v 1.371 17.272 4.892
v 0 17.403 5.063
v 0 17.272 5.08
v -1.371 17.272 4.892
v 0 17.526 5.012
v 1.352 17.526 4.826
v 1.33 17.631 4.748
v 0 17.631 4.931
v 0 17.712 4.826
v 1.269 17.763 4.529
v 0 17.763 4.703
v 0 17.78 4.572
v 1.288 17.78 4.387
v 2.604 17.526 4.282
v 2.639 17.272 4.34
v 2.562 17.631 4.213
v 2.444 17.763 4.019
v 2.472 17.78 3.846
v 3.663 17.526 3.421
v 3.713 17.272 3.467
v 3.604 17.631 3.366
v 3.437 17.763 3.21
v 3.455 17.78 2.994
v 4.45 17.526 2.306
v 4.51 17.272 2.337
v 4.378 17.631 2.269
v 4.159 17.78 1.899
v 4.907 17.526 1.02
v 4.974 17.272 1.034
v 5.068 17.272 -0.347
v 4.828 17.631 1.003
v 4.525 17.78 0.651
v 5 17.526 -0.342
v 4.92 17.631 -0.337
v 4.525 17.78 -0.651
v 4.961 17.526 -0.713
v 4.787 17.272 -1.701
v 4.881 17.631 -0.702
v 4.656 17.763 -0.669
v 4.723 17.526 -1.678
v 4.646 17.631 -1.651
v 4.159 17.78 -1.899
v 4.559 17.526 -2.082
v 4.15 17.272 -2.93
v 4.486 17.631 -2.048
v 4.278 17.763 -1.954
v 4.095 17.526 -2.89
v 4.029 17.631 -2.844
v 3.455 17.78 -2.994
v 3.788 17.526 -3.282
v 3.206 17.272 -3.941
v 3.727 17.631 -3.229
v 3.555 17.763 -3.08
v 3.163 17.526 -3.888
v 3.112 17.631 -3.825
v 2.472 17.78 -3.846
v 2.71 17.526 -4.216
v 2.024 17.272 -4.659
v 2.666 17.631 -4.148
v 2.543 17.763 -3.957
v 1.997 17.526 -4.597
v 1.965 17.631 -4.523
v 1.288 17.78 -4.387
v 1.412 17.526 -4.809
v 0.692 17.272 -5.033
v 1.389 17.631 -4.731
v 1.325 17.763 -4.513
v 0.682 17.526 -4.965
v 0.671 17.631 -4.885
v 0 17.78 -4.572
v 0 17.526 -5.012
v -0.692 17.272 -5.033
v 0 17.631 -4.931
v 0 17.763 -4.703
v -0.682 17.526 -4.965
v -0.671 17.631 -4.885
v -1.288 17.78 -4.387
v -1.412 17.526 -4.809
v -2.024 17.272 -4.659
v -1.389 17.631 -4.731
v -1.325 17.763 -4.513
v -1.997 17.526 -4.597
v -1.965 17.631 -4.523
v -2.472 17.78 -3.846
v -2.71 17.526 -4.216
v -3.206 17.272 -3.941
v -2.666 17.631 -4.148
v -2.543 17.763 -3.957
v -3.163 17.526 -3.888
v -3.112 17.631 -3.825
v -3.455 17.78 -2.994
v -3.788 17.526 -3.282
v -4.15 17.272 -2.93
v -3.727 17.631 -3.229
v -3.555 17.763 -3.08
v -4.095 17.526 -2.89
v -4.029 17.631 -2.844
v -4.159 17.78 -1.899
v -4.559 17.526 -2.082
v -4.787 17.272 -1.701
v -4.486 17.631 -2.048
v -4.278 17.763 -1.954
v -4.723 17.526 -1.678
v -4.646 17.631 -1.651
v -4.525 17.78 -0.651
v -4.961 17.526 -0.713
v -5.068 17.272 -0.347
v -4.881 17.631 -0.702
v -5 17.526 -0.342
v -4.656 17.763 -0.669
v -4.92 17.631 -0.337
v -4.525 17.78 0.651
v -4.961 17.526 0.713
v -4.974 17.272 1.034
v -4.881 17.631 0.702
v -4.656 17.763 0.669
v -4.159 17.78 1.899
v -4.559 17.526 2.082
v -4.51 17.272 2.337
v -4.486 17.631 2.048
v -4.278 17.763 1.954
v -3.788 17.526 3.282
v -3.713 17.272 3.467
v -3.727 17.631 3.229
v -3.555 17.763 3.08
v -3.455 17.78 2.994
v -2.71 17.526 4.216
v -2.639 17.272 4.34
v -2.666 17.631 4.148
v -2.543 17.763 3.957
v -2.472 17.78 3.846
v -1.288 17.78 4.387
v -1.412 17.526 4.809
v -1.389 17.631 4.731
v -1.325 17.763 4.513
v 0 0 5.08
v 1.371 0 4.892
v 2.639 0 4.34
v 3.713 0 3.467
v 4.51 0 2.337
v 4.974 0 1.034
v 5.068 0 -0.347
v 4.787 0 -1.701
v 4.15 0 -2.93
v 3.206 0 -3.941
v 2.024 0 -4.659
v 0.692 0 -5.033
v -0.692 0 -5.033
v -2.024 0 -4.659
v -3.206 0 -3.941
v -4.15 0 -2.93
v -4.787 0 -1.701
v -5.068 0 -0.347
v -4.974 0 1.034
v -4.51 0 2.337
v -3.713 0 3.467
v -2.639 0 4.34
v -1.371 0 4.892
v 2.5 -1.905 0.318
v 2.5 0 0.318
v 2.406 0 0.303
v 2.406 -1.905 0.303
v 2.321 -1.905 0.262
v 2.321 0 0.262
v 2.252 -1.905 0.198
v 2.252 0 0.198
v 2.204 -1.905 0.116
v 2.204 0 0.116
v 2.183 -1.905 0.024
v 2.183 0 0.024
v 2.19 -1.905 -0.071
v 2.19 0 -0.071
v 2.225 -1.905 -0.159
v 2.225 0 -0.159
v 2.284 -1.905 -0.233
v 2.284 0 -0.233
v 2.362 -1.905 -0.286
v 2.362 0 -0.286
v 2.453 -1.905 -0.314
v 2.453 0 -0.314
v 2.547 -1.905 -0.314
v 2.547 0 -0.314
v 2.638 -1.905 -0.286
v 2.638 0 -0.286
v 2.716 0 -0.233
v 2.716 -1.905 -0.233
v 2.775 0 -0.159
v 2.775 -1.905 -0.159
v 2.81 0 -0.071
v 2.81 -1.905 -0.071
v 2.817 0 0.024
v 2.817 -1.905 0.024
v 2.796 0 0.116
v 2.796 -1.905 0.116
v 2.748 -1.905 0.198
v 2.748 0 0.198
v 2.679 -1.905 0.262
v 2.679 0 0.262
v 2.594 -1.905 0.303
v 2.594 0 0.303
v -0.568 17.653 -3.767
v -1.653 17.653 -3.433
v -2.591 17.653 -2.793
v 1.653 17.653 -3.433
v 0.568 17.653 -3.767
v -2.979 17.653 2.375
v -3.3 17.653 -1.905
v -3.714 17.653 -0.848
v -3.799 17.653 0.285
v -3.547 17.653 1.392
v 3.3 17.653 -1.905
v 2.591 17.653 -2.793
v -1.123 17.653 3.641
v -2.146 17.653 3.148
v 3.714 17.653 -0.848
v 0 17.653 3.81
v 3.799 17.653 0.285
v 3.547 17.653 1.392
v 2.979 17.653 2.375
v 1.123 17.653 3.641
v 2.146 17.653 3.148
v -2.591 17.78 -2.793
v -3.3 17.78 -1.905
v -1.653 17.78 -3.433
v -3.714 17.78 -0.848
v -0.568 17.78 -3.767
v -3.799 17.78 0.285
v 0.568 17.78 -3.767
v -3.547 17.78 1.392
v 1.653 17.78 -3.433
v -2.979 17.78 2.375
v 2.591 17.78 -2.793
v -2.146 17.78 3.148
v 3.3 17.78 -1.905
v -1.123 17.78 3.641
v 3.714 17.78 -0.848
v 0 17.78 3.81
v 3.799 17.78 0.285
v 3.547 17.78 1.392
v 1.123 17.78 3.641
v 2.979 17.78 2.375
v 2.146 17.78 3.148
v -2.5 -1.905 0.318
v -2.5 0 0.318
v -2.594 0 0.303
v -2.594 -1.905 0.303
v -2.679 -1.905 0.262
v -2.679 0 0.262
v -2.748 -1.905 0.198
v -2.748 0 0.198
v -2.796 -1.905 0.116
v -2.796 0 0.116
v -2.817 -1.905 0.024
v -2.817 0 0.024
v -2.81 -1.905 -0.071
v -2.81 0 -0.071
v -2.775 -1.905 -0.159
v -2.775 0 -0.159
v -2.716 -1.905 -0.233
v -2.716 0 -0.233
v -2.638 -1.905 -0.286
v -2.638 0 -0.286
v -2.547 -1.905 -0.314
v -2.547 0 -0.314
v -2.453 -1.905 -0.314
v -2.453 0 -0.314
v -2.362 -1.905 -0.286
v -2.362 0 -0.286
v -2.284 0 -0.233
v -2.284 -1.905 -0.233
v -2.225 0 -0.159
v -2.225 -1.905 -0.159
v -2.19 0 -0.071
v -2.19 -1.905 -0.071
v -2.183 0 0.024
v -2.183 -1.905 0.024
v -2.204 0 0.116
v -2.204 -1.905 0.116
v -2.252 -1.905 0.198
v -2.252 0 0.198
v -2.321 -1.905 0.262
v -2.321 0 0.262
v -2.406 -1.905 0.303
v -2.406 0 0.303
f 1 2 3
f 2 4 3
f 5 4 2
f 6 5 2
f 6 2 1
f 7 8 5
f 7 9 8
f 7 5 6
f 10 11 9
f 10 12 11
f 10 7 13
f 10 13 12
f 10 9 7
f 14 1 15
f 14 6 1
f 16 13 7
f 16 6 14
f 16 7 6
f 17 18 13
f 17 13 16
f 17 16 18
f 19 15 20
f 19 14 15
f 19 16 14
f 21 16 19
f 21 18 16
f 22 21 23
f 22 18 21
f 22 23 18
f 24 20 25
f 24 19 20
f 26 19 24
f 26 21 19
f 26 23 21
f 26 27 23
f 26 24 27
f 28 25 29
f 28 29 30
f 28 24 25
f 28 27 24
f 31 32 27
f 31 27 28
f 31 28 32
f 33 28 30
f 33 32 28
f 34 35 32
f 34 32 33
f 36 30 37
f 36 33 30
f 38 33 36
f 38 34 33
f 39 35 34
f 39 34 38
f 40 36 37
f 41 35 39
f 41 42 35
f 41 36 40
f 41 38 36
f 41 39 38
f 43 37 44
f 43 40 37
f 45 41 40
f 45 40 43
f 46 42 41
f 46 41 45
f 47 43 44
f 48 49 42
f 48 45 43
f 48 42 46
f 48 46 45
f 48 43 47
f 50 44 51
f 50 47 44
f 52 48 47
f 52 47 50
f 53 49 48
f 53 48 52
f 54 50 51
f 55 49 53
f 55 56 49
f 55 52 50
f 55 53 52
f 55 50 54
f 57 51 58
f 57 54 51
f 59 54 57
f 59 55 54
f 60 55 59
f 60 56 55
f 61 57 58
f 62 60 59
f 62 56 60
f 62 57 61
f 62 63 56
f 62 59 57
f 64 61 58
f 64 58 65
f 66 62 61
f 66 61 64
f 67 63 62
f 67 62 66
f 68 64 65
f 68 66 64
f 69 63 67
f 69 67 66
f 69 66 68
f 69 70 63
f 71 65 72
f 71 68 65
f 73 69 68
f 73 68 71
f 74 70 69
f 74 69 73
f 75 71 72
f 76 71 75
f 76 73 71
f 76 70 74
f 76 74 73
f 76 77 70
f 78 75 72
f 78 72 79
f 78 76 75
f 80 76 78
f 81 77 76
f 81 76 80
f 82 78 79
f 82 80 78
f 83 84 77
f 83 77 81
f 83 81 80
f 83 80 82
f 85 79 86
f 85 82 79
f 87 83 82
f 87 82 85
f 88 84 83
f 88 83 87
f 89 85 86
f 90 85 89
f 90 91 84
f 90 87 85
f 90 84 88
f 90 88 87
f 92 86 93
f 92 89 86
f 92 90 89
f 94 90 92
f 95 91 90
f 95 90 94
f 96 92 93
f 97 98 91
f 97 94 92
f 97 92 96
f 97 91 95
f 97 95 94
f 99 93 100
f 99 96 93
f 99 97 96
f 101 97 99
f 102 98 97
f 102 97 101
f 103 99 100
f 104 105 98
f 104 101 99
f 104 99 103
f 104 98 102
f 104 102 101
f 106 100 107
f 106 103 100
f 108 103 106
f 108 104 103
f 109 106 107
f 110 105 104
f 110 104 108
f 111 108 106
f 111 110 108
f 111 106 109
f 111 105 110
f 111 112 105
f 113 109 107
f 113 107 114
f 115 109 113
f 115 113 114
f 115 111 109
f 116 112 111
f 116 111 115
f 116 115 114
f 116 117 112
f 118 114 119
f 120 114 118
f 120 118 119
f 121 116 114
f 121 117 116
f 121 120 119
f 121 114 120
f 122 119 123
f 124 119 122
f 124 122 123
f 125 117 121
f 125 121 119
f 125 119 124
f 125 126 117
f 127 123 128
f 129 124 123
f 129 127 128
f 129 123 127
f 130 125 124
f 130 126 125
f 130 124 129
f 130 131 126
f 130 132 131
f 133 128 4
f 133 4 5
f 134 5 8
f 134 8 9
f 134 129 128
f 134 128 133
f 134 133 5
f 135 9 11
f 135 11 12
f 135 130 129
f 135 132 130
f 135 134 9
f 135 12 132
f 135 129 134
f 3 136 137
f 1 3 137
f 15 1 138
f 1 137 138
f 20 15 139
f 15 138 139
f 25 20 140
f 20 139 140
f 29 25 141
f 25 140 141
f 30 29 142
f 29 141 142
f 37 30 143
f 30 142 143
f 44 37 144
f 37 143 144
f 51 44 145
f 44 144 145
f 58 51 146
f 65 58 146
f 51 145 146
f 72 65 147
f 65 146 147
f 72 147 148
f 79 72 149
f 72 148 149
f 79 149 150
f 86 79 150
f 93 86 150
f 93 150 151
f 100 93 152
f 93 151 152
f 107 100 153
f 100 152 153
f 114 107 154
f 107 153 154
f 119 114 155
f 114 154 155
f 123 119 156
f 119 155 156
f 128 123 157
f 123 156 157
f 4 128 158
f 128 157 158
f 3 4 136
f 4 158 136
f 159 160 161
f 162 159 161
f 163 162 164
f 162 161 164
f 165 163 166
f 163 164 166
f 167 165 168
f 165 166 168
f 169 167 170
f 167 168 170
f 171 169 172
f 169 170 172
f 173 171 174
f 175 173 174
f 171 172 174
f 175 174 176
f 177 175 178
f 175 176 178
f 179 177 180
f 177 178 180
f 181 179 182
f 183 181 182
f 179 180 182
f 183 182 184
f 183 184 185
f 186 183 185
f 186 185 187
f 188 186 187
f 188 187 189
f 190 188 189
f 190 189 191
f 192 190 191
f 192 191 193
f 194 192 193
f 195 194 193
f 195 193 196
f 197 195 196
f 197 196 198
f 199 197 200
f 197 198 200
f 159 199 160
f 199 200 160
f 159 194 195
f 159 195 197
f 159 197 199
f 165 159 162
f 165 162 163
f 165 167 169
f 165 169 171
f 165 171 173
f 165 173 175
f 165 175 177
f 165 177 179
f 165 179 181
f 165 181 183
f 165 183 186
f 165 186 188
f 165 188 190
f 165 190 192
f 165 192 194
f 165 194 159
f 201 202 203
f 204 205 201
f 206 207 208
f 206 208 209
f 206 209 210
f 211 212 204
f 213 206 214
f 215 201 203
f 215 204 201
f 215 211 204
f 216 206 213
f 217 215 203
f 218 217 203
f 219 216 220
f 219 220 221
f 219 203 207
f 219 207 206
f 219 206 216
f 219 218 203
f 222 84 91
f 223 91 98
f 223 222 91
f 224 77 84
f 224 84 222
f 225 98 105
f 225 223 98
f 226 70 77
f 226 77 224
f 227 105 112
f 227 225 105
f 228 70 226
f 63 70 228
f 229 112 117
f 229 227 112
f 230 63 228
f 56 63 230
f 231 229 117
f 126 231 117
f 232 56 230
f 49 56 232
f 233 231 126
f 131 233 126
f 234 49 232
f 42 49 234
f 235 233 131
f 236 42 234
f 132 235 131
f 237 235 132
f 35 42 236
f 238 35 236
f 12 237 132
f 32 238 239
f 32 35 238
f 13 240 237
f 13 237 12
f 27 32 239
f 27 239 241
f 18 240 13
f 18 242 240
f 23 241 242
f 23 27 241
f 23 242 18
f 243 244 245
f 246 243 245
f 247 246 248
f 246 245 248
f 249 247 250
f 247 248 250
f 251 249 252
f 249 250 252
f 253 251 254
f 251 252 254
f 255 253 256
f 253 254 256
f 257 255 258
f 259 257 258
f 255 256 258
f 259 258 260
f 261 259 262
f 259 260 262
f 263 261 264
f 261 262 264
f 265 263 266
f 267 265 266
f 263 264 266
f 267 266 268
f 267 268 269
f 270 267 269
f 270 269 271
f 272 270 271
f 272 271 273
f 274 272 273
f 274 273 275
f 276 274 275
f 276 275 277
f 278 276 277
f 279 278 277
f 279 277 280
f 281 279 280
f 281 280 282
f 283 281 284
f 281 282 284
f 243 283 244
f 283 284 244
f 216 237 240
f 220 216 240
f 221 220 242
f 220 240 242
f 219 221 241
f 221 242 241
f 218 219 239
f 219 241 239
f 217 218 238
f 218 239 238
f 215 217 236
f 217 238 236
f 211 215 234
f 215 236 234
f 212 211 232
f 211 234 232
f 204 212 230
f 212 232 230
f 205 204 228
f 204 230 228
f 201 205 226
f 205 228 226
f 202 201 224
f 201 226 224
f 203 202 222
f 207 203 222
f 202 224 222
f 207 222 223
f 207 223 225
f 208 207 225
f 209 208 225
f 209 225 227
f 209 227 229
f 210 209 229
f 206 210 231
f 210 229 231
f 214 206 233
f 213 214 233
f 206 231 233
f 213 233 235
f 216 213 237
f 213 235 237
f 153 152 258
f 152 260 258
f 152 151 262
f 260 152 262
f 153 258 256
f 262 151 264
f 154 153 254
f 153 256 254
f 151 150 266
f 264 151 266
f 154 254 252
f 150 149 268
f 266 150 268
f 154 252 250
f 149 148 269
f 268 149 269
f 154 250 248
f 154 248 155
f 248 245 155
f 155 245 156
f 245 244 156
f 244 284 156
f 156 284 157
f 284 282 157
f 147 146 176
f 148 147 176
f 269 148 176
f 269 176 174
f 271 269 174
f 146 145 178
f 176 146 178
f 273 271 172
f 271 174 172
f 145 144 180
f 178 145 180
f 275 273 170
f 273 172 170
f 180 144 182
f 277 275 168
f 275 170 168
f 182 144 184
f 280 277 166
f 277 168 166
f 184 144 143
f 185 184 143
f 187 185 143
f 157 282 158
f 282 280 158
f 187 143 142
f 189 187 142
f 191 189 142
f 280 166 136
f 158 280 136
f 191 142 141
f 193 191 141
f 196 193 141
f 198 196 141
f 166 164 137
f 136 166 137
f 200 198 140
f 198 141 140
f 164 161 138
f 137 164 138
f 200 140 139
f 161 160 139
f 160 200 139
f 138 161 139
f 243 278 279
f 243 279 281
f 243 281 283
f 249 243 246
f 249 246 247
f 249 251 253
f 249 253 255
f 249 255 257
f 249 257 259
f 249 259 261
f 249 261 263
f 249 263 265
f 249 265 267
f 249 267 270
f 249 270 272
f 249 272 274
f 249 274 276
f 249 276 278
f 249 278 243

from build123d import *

# Parameters (mm, degrees)
SKETCH1_R           = 5.08
BOSS_EXTRUDE1_DEPTH = 17.78
SKETCH2_R           = 0.3175
BOSS_EXTRUDE2_DEPTH = 1.905
SKETCH3_R           = 3.81
CUT_EXTRUDE1_DEPTH  = 0.127
FILLET1_R           = 0.508


with BuildPart() as part:
    # Sketch1 → Boss-Extrude1 (new body)
    with BuildSketch(Plane(origin=(0, 0, 0), x_dir=(1, 0, 0), z_dir=(0, 1, 0))):
        with Locations(Location((0, 0, 0), (0, 0, 270))):
            Circle(SKETCH1_R)
    extrude(amount=BOSS_EXTRUDE1_DEPTH)

    # Sketch2 → Boss-Extrude2 (add)
    with BuildSketch(Plane.XZ):
        with Locations(Location((-2.5, 0, 0), (0, 0, 90))):
            Circle(SKETCH2_R)
        with Locations(Location((2.5, 0, 0), (0, 0, 90))):
            Circle(SKETCH2_R)
    extrude(amount=BOSS_EXTRUDE2_DEPTH)

    # Sketch3 → Cut-Extrude1 (cut)
    with BuildSketch(Plane(origin=(0, 17.78, 0), x_dir=(1, 0, 0), z_dir=(0, 1, 0))):
        with Locations(Location((0, 0, 0), (0, 0, 270))):
            Circle(SKETCH3_R)
    extrude(amount=-CUT_EXTRUDE1_DEPTH, mode=Mode.SUBTRACT)

    # Fillet1
    fillet1_edges = [part.edges().sort_by_distance(p)[0] for p in [
        (0, 17.78, -5.08),
    ]]
    fillet(fillet1_edges, radius=FILLET1_R)


solid = part.part
